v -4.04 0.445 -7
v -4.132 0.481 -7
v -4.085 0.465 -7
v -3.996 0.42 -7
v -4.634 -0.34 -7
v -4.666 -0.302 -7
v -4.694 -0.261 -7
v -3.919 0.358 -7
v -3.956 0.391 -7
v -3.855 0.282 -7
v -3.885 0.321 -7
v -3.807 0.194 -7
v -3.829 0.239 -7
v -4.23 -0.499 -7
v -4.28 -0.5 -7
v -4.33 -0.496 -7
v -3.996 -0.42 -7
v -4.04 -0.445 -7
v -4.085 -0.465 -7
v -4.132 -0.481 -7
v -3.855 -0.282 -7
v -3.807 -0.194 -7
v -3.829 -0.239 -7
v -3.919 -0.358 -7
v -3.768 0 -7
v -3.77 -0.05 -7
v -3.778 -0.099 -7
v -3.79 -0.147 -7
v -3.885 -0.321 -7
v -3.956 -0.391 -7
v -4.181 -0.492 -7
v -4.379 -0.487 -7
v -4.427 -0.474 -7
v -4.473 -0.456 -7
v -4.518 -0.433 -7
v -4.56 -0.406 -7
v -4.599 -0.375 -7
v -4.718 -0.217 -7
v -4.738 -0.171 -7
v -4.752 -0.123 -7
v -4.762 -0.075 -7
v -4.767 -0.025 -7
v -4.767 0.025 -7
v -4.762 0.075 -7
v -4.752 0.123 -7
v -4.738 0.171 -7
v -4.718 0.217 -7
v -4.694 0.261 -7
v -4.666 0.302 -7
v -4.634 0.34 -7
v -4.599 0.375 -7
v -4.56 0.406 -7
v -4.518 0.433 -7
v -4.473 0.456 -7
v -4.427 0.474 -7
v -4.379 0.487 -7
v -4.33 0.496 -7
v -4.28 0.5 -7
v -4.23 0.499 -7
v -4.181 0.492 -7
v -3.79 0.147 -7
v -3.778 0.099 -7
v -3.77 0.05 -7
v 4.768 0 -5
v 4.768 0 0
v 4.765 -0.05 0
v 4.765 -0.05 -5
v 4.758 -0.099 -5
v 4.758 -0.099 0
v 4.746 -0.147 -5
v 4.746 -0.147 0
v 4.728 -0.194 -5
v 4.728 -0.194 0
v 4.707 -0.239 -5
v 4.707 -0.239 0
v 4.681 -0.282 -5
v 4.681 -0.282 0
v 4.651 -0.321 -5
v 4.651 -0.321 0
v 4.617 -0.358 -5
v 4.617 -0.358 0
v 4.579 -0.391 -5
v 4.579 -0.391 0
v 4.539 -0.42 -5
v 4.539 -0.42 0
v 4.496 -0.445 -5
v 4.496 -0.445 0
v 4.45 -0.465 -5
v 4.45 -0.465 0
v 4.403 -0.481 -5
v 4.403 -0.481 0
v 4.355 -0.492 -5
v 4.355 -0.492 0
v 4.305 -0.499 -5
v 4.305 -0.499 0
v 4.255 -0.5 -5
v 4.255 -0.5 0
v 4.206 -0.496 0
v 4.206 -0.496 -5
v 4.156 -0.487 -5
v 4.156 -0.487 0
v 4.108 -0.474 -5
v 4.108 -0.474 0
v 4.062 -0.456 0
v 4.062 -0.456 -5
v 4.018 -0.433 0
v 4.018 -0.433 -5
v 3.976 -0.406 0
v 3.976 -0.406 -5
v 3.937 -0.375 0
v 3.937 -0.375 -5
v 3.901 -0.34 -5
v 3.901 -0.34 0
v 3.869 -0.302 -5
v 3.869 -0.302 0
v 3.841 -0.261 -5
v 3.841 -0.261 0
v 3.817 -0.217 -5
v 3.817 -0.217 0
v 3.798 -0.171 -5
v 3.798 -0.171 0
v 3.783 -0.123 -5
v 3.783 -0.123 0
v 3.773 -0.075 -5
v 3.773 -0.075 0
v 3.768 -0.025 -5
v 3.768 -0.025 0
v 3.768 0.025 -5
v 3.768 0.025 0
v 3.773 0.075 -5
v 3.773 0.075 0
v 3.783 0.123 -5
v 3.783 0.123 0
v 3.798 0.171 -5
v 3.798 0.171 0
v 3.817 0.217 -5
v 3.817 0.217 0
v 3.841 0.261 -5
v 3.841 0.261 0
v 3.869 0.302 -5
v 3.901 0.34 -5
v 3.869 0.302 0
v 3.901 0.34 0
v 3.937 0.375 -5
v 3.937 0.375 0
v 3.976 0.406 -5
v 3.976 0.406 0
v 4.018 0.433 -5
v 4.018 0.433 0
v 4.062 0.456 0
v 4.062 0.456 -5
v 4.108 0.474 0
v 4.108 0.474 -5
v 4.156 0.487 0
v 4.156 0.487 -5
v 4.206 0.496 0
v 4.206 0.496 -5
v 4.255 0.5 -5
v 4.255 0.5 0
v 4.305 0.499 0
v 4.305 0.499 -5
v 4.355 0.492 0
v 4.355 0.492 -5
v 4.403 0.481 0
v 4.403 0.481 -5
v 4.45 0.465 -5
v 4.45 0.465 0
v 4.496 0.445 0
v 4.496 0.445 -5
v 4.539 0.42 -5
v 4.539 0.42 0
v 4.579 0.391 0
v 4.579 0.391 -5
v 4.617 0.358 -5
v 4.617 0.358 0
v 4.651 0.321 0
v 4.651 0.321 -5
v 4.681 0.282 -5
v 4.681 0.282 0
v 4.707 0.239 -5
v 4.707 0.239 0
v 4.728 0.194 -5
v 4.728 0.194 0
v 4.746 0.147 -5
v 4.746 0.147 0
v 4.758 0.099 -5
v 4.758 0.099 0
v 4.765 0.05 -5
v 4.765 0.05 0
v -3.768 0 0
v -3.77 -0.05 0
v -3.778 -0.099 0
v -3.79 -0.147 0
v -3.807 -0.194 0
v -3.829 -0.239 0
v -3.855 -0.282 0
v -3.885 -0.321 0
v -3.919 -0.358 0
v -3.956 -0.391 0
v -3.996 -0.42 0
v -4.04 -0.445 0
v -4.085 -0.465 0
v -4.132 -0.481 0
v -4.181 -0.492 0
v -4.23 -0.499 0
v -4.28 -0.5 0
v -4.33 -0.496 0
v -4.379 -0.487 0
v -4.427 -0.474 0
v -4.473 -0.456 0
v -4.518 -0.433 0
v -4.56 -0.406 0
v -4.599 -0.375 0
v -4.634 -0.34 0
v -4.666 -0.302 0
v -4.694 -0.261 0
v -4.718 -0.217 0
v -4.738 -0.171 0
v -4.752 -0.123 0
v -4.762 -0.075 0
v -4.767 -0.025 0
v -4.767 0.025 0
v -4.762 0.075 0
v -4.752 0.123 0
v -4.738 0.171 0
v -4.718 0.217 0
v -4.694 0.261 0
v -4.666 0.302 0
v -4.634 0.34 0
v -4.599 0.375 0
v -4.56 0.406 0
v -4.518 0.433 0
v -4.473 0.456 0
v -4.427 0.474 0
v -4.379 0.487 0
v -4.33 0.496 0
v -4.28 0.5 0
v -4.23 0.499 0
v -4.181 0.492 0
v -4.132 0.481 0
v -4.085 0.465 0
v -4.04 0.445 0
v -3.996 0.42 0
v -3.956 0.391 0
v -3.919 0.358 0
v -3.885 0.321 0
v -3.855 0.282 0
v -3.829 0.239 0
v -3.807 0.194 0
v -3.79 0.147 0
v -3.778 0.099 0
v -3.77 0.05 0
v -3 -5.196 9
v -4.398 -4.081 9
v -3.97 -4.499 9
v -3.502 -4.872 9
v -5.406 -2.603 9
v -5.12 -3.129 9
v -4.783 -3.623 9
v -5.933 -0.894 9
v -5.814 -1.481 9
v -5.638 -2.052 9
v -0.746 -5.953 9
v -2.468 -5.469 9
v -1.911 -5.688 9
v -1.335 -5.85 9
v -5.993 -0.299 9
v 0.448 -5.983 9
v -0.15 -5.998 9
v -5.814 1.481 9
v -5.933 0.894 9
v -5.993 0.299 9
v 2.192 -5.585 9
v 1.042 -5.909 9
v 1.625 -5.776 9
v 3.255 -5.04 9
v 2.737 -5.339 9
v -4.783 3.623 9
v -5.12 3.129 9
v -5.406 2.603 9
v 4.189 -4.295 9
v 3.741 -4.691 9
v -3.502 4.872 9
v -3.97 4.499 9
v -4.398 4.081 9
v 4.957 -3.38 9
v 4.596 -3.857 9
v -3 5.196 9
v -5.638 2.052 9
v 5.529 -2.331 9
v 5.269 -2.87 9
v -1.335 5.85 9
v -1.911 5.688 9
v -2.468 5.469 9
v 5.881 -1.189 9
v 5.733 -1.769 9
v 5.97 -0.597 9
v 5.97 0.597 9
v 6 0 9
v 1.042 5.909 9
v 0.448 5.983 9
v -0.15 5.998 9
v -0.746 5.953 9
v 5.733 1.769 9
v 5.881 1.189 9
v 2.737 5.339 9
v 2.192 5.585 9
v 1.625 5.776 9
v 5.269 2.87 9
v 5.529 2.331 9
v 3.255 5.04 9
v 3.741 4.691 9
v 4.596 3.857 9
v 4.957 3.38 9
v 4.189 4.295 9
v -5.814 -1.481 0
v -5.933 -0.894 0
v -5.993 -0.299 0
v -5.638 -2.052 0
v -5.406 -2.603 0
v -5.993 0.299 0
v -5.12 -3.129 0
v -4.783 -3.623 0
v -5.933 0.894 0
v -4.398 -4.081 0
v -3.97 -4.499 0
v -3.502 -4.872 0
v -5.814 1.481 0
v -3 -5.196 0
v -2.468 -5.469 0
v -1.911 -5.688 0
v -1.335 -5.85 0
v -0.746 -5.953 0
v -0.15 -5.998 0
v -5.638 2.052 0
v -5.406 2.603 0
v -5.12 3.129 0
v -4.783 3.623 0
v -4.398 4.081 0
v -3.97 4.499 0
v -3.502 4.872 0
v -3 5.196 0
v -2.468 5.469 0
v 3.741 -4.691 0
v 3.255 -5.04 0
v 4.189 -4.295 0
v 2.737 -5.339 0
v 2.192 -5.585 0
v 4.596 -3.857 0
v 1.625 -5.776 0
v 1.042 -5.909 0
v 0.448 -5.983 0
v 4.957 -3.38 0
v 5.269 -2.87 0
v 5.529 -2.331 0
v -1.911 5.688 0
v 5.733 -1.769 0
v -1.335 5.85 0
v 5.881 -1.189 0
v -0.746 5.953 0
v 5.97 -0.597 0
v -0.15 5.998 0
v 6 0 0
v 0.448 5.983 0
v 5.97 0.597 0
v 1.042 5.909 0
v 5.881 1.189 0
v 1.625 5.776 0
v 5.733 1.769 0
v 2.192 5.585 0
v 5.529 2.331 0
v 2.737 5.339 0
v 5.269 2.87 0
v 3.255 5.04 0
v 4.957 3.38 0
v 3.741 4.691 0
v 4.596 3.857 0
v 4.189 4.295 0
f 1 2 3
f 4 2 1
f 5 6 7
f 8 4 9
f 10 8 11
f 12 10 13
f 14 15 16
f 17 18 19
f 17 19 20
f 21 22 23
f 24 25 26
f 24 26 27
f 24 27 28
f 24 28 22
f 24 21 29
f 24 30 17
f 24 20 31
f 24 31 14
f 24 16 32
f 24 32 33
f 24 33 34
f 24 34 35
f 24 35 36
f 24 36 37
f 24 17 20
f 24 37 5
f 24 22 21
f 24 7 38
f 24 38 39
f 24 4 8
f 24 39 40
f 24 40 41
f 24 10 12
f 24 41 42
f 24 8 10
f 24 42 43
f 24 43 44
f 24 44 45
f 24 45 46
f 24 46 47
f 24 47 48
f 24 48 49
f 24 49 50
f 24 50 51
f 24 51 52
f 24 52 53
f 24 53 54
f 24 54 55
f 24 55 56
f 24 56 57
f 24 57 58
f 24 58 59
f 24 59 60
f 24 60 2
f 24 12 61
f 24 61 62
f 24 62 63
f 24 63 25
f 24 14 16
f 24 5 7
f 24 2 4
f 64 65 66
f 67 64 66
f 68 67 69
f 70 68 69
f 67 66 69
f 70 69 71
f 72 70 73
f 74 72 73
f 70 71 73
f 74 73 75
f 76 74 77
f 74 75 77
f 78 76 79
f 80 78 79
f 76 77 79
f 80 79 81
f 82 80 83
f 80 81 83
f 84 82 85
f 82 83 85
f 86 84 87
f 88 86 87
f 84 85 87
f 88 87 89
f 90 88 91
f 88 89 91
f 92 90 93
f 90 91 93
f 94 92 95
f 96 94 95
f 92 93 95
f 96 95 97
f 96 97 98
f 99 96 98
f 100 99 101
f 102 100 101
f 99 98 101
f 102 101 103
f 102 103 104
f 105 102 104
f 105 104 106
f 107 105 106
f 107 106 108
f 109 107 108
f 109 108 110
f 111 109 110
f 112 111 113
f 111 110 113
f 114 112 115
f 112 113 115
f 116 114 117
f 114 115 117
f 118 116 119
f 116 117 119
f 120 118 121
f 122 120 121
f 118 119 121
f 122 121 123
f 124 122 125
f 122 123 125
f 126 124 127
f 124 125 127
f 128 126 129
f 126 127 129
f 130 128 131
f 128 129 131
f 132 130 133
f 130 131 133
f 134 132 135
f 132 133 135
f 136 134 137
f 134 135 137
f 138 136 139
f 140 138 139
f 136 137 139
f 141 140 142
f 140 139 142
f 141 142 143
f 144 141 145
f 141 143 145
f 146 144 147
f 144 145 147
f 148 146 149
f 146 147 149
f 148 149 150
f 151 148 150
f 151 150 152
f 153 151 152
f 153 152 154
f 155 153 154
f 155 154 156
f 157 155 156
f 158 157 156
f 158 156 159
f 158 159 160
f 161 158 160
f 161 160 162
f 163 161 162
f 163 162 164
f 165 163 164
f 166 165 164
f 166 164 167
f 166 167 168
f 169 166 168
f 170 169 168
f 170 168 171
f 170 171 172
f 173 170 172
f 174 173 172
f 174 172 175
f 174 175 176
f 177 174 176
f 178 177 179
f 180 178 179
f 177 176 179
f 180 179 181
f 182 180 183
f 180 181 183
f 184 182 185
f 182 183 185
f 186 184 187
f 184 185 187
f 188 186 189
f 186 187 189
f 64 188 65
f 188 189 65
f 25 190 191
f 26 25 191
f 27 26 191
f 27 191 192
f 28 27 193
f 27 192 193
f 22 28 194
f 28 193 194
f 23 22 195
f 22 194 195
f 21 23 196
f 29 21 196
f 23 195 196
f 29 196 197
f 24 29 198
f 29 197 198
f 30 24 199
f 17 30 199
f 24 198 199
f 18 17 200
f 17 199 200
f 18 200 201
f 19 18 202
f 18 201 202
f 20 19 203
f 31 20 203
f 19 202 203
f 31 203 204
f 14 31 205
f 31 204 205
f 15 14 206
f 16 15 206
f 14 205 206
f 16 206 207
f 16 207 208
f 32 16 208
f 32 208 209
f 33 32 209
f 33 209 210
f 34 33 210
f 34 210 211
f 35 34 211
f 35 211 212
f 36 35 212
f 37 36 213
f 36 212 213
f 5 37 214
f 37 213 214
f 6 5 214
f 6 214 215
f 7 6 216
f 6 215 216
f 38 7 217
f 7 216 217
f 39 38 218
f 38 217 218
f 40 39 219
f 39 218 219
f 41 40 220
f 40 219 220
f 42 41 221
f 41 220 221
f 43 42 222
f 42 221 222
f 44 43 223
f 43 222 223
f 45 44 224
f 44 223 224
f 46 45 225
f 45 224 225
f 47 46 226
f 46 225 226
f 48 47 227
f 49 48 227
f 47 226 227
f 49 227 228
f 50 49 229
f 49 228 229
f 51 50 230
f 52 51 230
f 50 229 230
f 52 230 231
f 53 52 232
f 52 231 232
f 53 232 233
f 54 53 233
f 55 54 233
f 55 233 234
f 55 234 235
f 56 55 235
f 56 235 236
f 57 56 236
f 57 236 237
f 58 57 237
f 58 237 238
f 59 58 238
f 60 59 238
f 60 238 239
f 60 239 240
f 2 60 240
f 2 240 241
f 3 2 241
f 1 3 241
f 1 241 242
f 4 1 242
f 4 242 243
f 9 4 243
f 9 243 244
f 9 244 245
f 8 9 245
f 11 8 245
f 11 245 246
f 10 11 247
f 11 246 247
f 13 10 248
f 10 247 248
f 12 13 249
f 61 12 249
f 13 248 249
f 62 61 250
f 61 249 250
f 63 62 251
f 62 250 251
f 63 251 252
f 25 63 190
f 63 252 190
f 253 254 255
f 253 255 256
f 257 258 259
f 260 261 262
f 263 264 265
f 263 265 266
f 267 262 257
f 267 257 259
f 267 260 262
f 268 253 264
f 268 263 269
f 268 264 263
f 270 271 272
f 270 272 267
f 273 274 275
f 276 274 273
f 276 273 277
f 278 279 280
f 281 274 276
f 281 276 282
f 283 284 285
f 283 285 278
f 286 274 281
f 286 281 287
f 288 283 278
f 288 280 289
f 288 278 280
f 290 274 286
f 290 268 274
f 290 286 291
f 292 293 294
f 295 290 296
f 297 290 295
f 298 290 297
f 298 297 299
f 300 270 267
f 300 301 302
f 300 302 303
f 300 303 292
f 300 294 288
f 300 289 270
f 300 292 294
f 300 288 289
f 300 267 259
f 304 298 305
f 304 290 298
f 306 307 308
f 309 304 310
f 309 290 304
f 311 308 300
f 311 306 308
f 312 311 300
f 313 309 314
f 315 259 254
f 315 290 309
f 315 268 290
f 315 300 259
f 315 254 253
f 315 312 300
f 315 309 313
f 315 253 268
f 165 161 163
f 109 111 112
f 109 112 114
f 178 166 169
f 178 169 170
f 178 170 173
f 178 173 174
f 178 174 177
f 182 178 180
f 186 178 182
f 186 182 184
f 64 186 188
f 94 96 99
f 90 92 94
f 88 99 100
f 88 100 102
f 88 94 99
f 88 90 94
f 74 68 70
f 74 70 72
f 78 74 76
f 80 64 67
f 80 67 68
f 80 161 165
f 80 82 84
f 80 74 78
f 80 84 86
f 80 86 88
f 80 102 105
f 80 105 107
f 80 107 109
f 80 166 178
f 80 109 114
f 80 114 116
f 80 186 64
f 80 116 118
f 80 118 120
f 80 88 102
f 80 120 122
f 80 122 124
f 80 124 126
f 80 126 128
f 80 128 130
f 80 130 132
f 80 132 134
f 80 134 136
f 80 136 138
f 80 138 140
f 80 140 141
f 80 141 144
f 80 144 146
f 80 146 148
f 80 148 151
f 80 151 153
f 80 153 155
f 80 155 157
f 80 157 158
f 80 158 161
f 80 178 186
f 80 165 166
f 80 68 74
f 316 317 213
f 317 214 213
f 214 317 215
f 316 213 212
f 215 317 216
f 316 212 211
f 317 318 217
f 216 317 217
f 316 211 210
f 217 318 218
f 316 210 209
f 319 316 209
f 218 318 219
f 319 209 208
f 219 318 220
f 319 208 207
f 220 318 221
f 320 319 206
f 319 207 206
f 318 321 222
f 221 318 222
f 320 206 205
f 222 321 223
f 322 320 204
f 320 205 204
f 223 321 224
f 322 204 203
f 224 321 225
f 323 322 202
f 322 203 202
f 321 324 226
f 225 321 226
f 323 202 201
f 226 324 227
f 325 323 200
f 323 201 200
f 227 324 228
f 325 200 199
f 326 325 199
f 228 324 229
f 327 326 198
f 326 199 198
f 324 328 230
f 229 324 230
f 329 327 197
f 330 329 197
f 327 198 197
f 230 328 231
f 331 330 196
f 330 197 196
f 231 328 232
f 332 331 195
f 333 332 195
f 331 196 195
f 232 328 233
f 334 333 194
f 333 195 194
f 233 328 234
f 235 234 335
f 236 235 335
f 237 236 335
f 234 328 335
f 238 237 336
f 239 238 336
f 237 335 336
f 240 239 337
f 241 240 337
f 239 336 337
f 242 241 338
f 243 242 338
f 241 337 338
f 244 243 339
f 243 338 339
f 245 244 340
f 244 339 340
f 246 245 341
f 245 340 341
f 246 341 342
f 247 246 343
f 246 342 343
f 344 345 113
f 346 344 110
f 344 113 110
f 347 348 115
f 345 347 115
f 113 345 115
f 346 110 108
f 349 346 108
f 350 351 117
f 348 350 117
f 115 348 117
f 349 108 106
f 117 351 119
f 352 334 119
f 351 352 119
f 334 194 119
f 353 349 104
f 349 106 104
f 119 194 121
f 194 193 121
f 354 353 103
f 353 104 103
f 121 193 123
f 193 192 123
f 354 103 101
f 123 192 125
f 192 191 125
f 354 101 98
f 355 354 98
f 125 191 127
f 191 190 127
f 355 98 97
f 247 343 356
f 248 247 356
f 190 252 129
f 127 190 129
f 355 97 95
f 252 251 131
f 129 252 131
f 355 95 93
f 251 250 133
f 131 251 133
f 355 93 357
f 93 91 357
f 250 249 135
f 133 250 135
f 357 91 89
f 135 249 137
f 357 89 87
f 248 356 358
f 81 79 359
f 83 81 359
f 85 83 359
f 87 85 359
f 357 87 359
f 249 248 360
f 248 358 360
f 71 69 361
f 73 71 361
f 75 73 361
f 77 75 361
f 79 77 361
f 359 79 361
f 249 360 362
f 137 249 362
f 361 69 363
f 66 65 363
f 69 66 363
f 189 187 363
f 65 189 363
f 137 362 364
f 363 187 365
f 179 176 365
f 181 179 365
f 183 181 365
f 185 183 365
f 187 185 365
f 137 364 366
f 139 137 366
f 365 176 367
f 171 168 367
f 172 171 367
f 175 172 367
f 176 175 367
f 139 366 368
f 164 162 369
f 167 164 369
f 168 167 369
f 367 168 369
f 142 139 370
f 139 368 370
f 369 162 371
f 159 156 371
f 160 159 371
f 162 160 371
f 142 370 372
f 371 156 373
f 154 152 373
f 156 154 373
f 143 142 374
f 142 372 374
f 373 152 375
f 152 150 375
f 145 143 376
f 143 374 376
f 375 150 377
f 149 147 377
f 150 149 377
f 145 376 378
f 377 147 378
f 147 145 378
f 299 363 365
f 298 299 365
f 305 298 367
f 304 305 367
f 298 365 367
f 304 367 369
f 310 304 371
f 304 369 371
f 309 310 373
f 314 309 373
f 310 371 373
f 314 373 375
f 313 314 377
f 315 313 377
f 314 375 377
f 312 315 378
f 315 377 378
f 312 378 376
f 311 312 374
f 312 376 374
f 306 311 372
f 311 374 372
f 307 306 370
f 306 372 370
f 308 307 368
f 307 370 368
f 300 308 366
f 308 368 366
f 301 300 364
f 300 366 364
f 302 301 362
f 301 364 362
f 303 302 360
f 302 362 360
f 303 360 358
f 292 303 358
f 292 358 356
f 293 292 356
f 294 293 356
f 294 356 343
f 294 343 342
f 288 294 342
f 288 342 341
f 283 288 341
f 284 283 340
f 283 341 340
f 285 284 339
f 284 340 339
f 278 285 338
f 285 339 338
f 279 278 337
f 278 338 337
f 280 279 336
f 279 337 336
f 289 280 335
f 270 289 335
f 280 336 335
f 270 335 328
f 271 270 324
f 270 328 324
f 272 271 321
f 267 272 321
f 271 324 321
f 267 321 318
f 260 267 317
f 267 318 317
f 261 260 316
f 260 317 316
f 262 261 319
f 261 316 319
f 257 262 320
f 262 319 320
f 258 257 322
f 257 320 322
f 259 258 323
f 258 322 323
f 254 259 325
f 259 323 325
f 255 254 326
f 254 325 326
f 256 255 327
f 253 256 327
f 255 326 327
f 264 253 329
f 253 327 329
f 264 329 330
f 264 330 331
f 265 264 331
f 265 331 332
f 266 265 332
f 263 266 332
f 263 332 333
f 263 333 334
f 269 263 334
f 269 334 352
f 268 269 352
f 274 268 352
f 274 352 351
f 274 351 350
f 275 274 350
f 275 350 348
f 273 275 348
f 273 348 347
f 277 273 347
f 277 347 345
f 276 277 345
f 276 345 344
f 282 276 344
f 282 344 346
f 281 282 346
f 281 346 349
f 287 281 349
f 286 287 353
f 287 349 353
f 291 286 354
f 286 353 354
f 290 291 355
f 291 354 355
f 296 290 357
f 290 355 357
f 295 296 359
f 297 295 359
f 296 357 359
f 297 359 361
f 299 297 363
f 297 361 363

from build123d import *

# Parameters (mm, degrees)
F0_R     = 6
F1_DEPTH = 9
F2_R     = 0.5
F3_DEPTH = 7
F4_DEPTH = 5


with BuildPart() as f1:
    # F0 (on Top) → F1 (new body)
    with BuildSketch(Plane.XY):
        Circle(F0_R)
    extrude(amount=F1_DEPTH)

    # F2 (on face) → F3 (join)
    with BuildSketch(Plane(origin=(0, 0, 0), x_dir=(1, 0, 0), z_dir=(0, 0, -1))):
        with Locations((-4.267732, 0)):
            Circle(F2_R)
    extrude(amount=F3_DEPTH)

    # F2 (on face) → F4 (join)
    with BuildSketch(Plane(origin=(0, 0, 0), x_dir=(1, 0, 0), z_dir=(0, 0, -1))):
        with Locations((4.267732, 0)):
            Circle(F2_R)
    extrude(amount=F4_DEPTH)


solid = f1.part
